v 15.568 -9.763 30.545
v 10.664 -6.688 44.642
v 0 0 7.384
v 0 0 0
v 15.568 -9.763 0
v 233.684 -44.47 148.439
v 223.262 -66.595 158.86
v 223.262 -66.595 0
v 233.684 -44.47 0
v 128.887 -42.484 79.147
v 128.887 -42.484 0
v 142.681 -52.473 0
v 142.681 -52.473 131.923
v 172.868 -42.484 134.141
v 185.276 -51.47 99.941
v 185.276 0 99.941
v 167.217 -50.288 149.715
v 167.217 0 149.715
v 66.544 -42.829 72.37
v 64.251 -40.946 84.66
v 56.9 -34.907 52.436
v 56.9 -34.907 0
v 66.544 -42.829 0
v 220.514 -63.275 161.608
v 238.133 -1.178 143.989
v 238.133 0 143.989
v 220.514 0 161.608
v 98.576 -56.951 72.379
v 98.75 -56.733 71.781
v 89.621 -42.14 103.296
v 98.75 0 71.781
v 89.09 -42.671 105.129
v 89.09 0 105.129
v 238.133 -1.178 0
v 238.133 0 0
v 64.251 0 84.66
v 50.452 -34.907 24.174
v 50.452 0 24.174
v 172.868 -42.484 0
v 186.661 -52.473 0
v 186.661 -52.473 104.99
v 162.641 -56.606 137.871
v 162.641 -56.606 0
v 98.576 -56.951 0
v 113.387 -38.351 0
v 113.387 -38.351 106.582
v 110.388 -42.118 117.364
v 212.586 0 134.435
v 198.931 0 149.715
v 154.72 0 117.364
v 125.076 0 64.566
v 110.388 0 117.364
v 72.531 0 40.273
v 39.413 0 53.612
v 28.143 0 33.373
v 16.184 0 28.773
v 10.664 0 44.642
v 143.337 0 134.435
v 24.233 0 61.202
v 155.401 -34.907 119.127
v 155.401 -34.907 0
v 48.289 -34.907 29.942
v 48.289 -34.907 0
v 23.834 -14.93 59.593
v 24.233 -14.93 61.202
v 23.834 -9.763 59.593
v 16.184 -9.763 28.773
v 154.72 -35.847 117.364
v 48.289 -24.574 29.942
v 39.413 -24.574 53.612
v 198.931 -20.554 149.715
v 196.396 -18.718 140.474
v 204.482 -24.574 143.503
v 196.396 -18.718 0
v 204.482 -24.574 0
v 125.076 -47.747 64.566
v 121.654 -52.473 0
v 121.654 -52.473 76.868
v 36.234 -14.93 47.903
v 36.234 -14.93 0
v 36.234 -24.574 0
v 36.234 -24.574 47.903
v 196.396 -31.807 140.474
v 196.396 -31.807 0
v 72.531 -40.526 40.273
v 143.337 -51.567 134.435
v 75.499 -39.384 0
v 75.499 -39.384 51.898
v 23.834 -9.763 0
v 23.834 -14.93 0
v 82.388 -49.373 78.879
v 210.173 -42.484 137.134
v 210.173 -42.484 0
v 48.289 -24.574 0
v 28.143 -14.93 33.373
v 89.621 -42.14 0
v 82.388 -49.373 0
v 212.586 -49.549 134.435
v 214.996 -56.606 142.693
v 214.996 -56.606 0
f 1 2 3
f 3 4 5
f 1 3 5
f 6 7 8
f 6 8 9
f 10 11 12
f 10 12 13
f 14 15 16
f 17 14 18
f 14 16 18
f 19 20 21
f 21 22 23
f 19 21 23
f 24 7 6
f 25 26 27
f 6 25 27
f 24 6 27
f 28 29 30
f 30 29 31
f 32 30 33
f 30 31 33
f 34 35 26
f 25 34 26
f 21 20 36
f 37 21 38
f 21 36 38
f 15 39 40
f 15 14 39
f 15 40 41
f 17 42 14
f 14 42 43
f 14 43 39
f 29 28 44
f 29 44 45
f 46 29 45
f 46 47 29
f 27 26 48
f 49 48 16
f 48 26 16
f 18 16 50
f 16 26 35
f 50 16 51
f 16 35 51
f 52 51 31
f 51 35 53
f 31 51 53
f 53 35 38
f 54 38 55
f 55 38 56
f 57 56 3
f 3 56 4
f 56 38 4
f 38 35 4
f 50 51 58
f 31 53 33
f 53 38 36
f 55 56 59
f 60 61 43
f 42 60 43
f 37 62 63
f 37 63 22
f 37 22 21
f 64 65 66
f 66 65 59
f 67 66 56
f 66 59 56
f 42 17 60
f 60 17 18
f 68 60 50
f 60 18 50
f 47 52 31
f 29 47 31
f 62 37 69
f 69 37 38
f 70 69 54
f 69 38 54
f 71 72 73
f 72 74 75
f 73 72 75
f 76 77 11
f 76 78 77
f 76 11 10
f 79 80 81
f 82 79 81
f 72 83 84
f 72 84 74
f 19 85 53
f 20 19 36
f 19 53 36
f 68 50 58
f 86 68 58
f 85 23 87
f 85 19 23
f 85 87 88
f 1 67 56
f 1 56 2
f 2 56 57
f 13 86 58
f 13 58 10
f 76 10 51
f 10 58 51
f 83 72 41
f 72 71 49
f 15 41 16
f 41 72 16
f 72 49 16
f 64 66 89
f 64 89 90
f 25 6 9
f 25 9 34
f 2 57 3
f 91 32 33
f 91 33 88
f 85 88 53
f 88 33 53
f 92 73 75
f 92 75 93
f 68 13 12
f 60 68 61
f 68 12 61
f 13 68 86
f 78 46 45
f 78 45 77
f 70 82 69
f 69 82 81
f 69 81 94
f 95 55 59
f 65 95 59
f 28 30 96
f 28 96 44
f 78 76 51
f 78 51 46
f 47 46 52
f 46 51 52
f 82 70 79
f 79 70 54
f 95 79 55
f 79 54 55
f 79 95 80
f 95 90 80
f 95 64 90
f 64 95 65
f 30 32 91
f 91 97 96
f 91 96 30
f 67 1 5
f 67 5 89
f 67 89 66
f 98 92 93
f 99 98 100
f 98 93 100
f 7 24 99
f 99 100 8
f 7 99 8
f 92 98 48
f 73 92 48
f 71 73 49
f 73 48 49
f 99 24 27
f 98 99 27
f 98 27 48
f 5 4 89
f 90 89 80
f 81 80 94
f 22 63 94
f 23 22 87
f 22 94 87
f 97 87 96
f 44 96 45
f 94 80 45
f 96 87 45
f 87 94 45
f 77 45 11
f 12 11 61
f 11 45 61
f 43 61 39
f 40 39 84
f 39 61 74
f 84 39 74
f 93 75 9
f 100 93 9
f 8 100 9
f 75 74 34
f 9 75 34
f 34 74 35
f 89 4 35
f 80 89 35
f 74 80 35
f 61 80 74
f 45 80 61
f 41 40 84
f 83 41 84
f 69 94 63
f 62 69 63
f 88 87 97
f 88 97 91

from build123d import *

# Parameters (mm, degrees)
F2_DEPTH = 188.468
F3_DEPTH = 66.595839


with BuildPart() as f2:
    # F1 (on Top) → F2 (new body)
    with BuildSketch(Plane.XY):
        Polygon((238.254488, 0), (0, 0), (15.567613, -9.763042), (23.834057, -9.763042), (23.834057, -14.92957), (36.233719, -14.92957), (36.233719, -24.573755), (48.288953, -24.573755), (48.288953, -34.906808), (56.899831, -34.906808), (66.544011, -42.828817), (75.499326, -39.384466), (82.388029, -49.373083), (89.621171, -42.139944), (98.576479, -56.950655), (113.38719, -38.35116), (121.653639, -52.473001), (128.886774, -42.48438), (142.680591, -52.473001), (155.400931, -34.906808), (162.641421, -56.606222), (172.867577, -42.48438), (186.661394, -52.473001), (196.396053, -31.806894), (196.396053, -18.718356), (204.482083, -24.573755), (210.173458, -42.48438), (214.995548, -56.606222), (223.261997, -66.594839), (233.683616, -44.470357), align=None)
    extrude(amount=F2_DEPTH)

    # F0 (on Front) → F3 (intersect, through all)
    with BuildSketch(Plane.XZ):
        Polygon((10.664172, 44.642482), (0, 7.384356), (0, 0), (238.133401, 0), (238.133401, 143.988803), (220.514372, 161.607817), (212.585822, 134.434521), (198.931083, 149.714991), (185.276344, 99.941269), (167.216852, 149.714991), (154.719889, 117.364436), (143.336907, 134.434521), (125.075892, 64.566277), (110.387675, 117.364436), (98.749742, 71.781114), (89.090228, 105.129436), (72.531059, 40.272702), (64.251475, 84.66047), (50.452169, 24.173511), (39.412726, 53.612031), (28.14329, 33.37305), (24.23349, 61.201647), (16.183894, 28.77328), align=None)
    extrude(amount=F3_DEPTH, mode=Mode.INTERSECT)


solid = f2.part
